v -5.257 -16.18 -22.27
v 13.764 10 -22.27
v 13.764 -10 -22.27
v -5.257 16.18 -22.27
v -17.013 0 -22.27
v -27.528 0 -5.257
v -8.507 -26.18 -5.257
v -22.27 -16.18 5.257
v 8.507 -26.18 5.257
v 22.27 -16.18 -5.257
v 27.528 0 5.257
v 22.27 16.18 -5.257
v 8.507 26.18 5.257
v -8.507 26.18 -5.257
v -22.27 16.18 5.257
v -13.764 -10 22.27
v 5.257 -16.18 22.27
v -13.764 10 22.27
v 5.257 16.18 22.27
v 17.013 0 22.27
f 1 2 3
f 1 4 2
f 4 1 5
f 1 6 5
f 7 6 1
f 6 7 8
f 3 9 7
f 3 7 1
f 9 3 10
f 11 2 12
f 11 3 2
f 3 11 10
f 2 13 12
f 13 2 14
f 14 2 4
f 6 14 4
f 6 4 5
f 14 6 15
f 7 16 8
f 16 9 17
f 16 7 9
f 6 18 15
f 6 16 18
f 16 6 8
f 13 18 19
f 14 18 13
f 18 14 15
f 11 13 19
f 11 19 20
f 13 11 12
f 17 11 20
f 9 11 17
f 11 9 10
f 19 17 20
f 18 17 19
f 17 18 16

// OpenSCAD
// file: ../functions/constants.scad
/* * * * * * * * * * * * * * * * * * * * * * * * * * * * * * * * * * * * *\
 * Copyright (C) Claus Schrammel <claus@f05fk.net>                       *
 *                                                                       *
 * This program is free software: you can redistribute it and/or modify  *
 * it under the terms of the GNU General Public License as published by  *
 * the Free Software Foundation, either version 3 of the License, or     *
 * (at your option) any later version.                                   *
 *                                                                       *
 * This program is distributed in the hope that it will be useful,       *
 * but WITHOUT ANY WARRANTY; without even the implied warranty of        *
 * MERCHANTABILITY or FITNESS FOR A PARTICULAR PURPOSE.  See the         *
 * GNU General Public License for more details.                          *
 *                                                                       *
 * You should have received a copy of the GNU General Public License     *
 * along with this program.  If not, see <http://www.gnu.org/licenses/>. *
 *                                                                       *
 * SPDX-License-Identifier: GPL-3.0-or-later                             *
\* * * * * * * * * * * * * * * * * * * * * * * * * * * * * * * * * * * * */

PHI = (1 + sqrt(5)) / 2;
phi = 1 / PHI;
// main file
/* * * * * * * * * * * * * * * * * * * * * * * * * * * * * * * * * * * * *\
 * Copyright (C) Claus Schrammel <claus@f05fk.net>                       *
 *                                                                       *
 * This program is free software: you can redistribute it and/or modify  *
 * it under the terms of the GNU General Public License as published by  *
 * the Free Software Foundation, either version 3 of the License, or     *
 * (at your option) any later version.                                   *
 *                                                                       *
 * This program is distributed in the hope that it will be useful,       *
 * but WITHOUT ANY WARRANTY; without even the implied warranty of        *
 * MERCHANTABILITY or FITNESS FOR A PARTICULAR PURPOSE.  See the         *
 * GNU General Public License for more details.                          *
 *                                                                       *
 * You should have received a copy of the GNU General Public License     *
 * along with this program.  If not, see <http://www.gnu.org/licenses/>. *
 *                                                                       *
 * SPDX-License-Identifier: GPL-3.0-or-later                             *
\* * * * * * * * * * * * * * * * * * * * * * * * * * * * * * * * * * * * */

include <../functions/constants.scad>;

scale(20) DodecahedronSphere();

module DodecahedronSphere() {
    factor = 1 / sqrt(10 - 2 * sqrt(5));
    polyhedron(
        points = [ [-2 *       cos(  0), -2 *       sin(  0), -PHI - 1],
                   [-2 *       cos( 72), -2 *       sin( 72), -PHI - 1],
                   [-2 *       cos(144), -2 *       sin(144), -PHI - 1],
                   [-2 *       cos(216), -2 *       sin(216), -PHI - 1],
                   [-2 *       cos(288), -2 *       sin(288), -PHI - 1],
                   [-2 * PHI * cos(  0), -2 * PHI * sin(  0), -PHI + 1],
                   [-2 * PHI * cos( 72), -2 * PHI * sin( 72), -PHI + 1],
                   [-2 * PHI * cos(144), -2 * PHI * sin(144), -PHI + 1],
                   [-2 * PHI * cos(216), -2 * PHI * sin(216), -PHI + 1],
                   [-2 * PHI * cos(288), -2 * PHI * sin(288), -PHI + 1],
                   [+2 * PHI * cos(  0), +2 * PHI * sin(  0), +PHI - 1],
                   [+2 * PHI * cos( 72), +2 * PHI * sin( 72), +PHI - 1],
                   [+2 * PHI * cos(144), +2 * PHI * sin(144), +PHI - 1],
                   [+2 * PHI * cos(216), +2 * PHI * sin(216), +PHI - 1],
                   [+2 * PHI * cos(288), +2 * PHI * sin(288), +PHI - 1],
                   [+2 *       cos(  0), +2 *       sin(  0), +PHI + 1],
                   [+2 *       cos( 72), +2 *       sin( 72), +PHI + 1],
                   [+2 *       cos(144), +2 *       sin(144), +PHI + 1],
                   [+2 *       cos(216), +2 *       sin(216), +PHI + 1],
                   [+2 *       cos(288), +2 *       sin(288), +PHI + 1],
                 ] * factor,
        faces = [ [ 0,  1,  2,  3,  4], [ 1,  0,  5, 13,  6], [ 2,  1,  6, 14,  7],
                  [ 3,  2,  7, 10,  8], [ 4,  3,  8, 11,  9], [ 0,  4,  9, 12,  5],
                  [18, 19, 14,  6, 13], [17, 18, 13,  5, 12], [16, 17, 12,  9, 11],
                  [15, 16, 11,  8, 10], [19, 15, 10,  7, 14], [19, 18, 17, 16, 15],
                ],
        convexity = 2);
}
